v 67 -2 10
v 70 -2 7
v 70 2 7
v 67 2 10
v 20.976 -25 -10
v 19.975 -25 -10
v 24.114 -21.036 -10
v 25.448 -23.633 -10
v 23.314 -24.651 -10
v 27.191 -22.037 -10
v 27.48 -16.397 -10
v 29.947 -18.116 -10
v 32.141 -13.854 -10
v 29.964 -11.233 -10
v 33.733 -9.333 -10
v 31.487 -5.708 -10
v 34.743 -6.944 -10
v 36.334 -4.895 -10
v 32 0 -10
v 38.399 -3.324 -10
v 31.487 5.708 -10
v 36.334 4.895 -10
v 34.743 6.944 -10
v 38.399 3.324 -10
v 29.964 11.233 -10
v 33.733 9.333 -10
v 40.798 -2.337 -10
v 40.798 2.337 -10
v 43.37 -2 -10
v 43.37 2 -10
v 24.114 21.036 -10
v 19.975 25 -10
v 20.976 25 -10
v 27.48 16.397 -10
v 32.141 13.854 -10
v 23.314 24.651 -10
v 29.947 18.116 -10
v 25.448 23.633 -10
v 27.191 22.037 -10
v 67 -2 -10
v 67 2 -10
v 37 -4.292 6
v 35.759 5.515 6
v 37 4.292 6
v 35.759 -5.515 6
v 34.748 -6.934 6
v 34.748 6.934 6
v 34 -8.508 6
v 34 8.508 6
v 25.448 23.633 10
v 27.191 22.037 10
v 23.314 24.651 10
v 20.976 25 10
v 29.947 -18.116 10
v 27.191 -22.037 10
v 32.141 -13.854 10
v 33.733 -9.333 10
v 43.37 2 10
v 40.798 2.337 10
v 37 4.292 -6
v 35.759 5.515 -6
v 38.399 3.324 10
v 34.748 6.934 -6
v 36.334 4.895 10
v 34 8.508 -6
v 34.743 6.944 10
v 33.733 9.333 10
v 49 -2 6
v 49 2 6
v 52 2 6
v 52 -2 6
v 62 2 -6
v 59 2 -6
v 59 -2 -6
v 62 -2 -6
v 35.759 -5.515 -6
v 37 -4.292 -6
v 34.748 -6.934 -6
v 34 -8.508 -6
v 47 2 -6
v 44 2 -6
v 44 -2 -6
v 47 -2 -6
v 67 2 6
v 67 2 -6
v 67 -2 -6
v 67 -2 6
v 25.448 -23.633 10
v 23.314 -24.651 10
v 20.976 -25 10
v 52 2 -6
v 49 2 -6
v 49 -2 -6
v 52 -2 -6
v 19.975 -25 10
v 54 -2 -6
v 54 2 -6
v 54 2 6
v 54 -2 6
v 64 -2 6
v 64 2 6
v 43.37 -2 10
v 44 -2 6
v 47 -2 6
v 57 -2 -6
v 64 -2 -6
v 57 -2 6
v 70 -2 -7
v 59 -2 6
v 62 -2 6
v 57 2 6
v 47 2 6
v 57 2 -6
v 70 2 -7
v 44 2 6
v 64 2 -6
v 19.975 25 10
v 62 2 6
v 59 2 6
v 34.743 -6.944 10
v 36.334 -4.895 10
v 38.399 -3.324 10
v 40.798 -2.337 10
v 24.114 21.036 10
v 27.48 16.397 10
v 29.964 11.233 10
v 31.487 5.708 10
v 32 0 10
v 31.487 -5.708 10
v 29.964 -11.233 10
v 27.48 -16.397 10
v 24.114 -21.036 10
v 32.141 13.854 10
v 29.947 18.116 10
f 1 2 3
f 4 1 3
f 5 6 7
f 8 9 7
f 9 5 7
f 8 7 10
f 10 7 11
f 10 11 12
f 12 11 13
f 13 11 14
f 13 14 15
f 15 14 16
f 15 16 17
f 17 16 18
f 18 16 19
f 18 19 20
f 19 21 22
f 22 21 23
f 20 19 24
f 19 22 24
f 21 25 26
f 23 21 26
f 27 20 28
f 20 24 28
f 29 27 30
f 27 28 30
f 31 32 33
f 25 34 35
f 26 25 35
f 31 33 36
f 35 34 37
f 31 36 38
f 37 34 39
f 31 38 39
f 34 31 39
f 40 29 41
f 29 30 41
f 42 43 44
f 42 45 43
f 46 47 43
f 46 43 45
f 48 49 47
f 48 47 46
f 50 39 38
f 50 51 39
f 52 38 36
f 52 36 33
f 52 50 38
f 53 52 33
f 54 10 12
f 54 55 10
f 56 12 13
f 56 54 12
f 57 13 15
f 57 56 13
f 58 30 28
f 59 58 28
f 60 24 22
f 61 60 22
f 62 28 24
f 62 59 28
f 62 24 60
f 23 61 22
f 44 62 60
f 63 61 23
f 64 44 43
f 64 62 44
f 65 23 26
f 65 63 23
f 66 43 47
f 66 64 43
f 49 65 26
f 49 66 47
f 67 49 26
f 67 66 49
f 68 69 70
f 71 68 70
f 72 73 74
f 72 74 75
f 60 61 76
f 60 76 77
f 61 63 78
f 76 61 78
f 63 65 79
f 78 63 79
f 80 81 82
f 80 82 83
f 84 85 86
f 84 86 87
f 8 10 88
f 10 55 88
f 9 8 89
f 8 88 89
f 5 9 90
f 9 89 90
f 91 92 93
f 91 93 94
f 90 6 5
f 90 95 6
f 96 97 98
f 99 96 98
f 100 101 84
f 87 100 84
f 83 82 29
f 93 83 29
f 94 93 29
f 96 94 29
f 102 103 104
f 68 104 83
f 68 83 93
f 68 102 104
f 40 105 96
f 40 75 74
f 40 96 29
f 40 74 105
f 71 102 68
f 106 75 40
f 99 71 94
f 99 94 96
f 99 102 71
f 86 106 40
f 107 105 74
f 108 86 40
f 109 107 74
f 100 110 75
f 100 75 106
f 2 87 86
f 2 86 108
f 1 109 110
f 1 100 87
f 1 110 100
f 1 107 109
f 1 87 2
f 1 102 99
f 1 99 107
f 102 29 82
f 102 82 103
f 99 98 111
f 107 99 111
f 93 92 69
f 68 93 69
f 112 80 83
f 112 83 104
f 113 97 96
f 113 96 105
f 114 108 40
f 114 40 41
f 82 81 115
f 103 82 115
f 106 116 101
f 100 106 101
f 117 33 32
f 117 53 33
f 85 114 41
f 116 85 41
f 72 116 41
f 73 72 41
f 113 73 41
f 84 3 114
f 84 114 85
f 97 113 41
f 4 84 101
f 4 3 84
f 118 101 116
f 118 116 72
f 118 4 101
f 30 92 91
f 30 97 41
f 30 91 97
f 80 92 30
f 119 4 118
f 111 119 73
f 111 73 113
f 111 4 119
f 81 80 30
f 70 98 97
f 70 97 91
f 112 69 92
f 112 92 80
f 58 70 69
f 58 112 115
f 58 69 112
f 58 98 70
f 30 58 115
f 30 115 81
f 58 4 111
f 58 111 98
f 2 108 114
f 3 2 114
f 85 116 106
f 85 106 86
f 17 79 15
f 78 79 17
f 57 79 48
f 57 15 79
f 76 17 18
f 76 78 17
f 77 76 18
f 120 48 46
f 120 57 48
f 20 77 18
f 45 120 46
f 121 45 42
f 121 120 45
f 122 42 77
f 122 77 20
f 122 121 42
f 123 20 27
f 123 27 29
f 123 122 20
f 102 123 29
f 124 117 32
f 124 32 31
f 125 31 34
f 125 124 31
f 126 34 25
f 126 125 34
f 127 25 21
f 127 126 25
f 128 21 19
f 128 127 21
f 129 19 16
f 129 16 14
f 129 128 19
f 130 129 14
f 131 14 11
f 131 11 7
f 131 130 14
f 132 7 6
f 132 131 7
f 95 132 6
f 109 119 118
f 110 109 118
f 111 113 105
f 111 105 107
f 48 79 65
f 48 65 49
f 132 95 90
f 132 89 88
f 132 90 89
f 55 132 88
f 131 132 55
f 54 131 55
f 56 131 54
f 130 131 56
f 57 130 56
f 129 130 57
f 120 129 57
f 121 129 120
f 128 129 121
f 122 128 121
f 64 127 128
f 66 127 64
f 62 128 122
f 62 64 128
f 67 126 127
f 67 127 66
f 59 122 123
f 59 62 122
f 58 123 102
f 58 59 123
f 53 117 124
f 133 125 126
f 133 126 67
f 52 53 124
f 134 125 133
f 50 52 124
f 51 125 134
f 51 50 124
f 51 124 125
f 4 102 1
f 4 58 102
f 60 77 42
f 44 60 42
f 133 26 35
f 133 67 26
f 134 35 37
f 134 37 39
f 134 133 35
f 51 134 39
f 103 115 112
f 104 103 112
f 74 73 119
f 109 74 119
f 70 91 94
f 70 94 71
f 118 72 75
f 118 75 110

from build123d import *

# Parameters (mm, degrees)
F1_DEPTH = 10
F2_W     = 3
F2_H     = 12
F3_DEPTH = 10
F5_SIZE  = 3
F6_R     = 8


with BuildPart() as f1:
    # F0 (on Top) → F1 (new body, symmetric)
    with BuildSketch(Plane.XY):
        with BuildLine():
            ThreePointArc((43.370497, 2), (37.315196, 4.041776), (33.732609, 9.333333))
            ThreePointArc((33.732609, 9.333333), (30.149158, 17.777184), (24.494897, 25))
            Line((24.494897, 25), (19.974984, 25))
            ThreePointArc((19.974984, 25), (32, 0), (19.974984, -25))
            Line((19.974984, -25), (24.494897, -25))
            ThreePointArc((24.494897, -25), (30.149158, -17.777184), (33.732609, -9.333333))
            ThreePointArc((33.732609, -9.333333), (37.315196, -4.041776), (43.370497, -2))
            Line((43.370497, -2), (70, -2))
            Line((70, -2), (70, 2))
            Line((70, 2), (43.370497, 2))
        make_face()
    extrude(amount=F1_DEPTH, both=True)


with BuildPart() as f3:
    # F2 (on Front) → F3 (new body, symmetric)
    with BuildSketch(Plane.XZ):
        with Locations((65.5, 0)):
            Rectangle(F2_W, F2_H)
        with Locations((45.5, 0)):
            Rectangle(F2_W, F2_H)
        with Locations((50.5, 0)):
            Rectangle(F2_W, F2_H)
        with Locations((60.5, 0)):
            Rectangle(F2_W, F2_H)
        with Locations((55.5, 0)):
            Rectangle(F2_W, F2_H)
        with Locations((35.5, 0)):
            Rectangle(F2_W, F2_H)
    extrude(amount=F3_DEPTH, both=True)


with BuildPart() as f1_1:
    add(f1.part)

    # F4: cut F3
    add(f3.part, mode=Mode.SUBTRACT)

    # F5
    f5_edges = [f1_1.edges().sort_by_distance(p)[0] for p in [
        (70, 0, 10),
        (70, 0, -10),
    ]]
    chamfer(f5_edges, length=F5_SIZE)

    # F6
    f6_edges = [f1_1.edges().sort_by_distance(p)[0] for p in [
        (24.494897, 25, 0),
        (24.494897, -25, 0),
    ]]
    fillet(f6_edges, radius=F6_R)


solid = f1_1.part
